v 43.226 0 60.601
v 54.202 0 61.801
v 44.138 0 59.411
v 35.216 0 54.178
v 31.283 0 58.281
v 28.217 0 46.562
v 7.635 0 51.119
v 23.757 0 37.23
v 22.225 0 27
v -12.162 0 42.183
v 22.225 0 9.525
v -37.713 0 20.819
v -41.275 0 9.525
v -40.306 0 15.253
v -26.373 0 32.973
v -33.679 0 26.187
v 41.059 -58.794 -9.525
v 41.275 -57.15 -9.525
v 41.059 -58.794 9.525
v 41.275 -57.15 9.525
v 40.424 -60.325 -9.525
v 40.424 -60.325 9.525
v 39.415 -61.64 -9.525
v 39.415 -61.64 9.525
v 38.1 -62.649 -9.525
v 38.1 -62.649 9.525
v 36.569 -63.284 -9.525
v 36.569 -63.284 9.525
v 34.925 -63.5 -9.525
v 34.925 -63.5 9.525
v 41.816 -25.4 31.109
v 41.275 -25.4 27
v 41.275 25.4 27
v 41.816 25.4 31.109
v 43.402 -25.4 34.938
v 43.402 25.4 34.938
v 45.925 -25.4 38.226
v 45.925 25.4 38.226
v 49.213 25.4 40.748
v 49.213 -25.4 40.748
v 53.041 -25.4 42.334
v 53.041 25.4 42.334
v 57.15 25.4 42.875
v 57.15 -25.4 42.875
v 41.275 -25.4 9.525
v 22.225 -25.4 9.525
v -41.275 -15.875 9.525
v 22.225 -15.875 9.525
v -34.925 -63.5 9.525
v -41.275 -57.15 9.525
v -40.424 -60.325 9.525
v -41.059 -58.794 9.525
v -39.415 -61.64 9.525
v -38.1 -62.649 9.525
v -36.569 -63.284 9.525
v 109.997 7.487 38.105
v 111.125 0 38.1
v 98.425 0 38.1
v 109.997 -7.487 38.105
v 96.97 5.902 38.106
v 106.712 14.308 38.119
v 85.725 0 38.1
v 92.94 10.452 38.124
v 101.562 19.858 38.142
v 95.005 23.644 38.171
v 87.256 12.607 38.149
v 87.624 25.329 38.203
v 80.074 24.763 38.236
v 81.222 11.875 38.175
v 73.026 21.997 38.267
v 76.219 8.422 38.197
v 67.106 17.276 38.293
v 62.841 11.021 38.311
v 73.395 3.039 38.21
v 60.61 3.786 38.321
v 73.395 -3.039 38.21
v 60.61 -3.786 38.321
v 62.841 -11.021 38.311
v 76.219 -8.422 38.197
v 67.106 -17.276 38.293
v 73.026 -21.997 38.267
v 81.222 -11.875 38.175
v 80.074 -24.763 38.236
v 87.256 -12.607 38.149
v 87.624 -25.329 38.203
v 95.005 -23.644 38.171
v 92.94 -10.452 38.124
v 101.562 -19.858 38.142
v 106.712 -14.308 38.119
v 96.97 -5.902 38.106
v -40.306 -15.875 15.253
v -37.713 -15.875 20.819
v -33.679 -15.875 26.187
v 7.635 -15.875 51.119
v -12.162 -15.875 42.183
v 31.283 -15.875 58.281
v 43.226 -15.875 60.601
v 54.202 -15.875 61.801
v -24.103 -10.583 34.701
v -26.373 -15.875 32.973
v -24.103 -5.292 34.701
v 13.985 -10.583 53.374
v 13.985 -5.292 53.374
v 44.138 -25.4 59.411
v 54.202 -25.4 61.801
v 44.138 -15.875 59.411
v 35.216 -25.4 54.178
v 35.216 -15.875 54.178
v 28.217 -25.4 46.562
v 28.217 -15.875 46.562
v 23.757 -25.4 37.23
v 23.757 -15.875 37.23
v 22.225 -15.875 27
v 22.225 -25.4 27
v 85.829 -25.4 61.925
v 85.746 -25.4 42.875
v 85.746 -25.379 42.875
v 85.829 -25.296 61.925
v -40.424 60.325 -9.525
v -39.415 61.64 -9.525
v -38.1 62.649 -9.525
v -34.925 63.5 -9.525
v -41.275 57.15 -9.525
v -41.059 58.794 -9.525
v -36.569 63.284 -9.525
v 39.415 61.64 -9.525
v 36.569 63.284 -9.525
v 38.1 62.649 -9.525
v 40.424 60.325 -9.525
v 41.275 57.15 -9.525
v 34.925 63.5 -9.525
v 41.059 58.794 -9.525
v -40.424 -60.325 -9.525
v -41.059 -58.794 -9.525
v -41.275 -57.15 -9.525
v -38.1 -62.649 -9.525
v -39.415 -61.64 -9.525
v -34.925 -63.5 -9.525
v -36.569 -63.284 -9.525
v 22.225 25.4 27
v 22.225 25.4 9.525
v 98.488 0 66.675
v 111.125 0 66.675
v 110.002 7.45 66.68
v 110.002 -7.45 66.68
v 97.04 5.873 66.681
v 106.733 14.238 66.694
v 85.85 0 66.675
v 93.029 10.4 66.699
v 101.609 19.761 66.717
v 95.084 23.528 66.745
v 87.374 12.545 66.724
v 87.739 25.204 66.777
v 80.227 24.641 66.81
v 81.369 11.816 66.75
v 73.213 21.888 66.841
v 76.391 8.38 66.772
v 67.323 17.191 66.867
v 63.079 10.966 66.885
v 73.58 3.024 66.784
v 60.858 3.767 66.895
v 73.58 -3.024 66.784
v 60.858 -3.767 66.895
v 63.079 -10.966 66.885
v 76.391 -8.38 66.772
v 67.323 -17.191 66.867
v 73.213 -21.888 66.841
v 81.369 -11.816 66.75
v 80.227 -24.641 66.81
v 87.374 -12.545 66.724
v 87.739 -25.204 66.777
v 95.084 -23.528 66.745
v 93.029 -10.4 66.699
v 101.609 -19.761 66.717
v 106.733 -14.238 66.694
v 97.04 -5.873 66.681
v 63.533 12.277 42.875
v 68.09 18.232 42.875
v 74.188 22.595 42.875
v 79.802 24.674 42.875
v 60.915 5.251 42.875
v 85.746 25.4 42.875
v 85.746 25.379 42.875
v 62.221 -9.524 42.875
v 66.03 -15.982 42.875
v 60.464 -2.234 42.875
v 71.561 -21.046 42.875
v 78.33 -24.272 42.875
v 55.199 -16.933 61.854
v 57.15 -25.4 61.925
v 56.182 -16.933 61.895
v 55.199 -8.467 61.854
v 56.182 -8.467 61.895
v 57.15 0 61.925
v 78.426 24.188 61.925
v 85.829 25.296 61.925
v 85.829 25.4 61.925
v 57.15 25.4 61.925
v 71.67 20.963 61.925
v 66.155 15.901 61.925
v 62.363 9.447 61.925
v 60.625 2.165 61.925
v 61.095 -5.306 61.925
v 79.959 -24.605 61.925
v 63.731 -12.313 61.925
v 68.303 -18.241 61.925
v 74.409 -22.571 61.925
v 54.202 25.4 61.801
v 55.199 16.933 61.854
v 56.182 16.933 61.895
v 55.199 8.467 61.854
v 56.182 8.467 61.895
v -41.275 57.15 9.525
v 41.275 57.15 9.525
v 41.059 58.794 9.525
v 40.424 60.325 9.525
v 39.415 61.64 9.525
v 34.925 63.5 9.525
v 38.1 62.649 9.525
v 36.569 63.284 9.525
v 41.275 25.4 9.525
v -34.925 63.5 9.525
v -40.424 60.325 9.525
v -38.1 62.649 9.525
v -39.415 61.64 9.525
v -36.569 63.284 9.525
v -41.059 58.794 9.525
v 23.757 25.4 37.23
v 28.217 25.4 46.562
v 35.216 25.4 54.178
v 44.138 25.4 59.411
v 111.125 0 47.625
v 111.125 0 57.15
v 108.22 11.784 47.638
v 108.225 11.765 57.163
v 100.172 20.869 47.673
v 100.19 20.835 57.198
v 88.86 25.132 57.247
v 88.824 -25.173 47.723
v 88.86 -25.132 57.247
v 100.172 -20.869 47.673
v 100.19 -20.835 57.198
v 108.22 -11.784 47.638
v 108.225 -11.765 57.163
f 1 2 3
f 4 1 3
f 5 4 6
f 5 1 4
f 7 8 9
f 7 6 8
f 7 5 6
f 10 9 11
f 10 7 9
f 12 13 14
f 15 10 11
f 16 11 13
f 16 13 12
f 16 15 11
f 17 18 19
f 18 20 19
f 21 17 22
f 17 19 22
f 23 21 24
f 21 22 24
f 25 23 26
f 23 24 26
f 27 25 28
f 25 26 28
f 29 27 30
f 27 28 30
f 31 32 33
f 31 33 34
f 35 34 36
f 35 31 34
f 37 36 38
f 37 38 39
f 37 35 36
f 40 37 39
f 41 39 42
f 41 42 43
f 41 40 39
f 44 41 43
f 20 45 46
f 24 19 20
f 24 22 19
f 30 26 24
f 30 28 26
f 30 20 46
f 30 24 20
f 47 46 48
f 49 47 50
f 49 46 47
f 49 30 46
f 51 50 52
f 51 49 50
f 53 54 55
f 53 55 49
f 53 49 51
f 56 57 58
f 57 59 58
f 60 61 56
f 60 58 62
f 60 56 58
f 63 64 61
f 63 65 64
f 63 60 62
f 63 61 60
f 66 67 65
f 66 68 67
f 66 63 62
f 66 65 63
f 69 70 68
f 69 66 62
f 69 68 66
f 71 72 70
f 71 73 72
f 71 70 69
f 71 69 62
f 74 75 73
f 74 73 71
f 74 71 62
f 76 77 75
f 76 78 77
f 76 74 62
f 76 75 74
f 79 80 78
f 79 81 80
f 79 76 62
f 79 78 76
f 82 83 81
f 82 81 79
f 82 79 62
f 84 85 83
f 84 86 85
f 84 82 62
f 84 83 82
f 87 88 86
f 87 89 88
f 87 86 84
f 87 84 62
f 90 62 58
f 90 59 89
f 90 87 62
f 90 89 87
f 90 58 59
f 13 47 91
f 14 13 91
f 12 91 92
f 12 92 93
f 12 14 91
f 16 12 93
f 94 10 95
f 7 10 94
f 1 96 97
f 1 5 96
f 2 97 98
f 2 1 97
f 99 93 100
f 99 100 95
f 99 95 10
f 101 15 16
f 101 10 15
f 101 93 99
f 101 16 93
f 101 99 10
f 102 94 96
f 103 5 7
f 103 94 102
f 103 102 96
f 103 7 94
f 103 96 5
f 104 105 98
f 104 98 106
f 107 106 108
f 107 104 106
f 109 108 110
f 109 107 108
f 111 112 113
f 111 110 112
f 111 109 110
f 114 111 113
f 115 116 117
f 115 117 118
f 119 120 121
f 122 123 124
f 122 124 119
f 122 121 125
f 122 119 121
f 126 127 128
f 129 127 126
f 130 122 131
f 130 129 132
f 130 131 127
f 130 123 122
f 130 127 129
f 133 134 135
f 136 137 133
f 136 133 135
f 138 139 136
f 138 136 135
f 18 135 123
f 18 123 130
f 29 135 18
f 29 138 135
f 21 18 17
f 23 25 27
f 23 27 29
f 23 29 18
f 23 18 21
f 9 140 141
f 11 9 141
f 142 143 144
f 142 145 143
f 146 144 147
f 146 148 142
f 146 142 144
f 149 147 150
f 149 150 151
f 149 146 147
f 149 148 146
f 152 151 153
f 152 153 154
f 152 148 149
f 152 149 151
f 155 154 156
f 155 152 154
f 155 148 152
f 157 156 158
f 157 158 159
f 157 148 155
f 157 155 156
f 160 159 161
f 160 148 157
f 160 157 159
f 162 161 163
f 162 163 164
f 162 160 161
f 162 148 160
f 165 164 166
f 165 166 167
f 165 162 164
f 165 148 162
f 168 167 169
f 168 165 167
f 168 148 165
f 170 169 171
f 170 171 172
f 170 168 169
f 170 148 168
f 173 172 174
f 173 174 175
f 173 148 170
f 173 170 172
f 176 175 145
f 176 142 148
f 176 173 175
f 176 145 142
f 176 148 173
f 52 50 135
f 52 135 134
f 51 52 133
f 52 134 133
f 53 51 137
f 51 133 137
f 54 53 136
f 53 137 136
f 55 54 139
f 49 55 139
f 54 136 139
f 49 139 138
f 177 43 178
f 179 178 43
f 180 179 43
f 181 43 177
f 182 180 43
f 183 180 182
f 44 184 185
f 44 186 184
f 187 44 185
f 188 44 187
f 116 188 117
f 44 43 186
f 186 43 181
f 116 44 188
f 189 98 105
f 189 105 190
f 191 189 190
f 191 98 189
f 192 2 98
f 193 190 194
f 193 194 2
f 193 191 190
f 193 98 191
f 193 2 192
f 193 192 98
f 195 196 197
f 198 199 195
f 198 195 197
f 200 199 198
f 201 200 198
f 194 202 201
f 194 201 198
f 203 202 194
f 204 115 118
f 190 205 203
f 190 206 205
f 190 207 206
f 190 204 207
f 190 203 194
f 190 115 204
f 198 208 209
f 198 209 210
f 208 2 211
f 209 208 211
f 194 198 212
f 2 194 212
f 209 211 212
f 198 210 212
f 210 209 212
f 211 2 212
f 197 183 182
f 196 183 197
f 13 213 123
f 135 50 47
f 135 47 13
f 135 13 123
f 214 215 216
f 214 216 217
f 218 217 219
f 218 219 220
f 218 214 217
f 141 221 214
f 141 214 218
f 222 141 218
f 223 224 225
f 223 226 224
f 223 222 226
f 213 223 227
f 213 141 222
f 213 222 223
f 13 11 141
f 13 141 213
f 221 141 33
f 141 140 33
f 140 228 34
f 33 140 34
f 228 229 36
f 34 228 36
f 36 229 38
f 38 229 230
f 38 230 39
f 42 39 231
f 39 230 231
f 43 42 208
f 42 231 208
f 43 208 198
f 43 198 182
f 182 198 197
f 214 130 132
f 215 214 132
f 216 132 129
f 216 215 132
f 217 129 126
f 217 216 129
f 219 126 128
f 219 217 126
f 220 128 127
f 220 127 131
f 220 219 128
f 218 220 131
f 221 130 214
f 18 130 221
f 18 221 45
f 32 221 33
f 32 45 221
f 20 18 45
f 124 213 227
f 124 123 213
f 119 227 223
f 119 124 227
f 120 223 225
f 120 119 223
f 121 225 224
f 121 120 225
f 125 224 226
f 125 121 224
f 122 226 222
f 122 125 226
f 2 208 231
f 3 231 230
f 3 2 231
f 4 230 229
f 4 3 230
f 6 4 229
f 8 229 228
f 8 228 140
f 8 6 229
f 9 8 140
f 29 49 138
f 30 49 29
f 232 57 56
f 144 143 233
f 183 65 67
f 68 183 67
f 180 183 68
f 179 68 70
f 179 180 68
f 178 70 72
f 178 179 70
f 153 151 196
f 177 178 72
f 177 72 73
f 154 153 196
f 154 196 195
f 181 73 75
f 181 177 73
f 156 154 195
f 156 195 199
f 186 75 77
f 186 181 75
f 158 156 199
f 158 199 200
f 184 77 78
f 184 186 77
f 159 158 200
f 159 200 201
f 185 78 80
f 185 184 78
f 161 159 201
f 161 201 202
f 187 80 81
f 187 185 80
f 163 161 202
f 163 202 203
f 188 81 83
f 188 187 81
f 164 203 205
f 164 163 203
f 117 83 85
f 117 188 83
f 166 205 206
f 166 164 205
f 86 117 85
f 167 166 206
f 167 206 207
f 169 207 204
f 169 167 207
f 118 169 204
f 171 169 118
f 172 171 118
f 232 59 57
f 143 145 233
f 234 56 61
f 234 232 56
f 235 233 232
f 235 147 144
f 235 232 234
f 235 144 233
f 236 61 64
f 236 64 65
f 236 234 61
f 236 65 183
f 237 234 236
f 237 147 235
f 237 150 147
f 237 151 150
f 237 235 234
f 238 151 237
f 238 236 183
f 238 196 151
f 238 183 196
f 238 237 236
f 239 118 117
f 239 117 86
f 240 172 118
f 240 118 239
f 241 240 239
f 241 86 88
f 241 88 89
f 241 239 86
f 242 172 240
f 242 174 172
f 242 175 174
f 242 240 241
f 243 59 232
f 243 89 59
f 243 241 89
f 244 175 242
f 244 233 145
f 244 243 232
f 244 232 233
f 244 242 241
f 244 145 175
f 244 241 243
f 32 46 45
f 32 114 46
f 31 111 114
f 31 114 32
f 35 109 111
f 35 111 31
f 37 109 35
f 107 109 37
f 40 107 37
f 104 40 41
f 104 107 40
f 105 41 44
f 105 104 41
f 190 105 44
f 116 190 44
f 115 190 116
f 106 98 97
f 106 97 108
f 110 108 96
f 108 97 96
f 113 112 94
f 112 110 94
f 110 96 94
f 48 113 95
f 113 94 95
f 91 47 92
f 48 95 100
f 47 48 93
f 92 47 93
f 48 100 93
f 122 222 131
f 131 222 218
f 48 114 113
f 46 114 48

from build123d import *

# Parameters (mm, degrees)
F1_DEPTH = 63.5
F2_DEPTH = 25.4
F3_DEPTH = 15.875
F5_R     = 6.35


with BuildPart() as f1:
    # F0 (on Front) → F1 (new body, symmetric)
    with BuildSketch(Plane.XZ):
        Polygon((-41.275, 9.525), (-41.275, -9.525), (41.275, -9.525), (41.275, 9.525), (22.225, 9.525), align=None)
    extrude(amount=F1_DEPTH, both=True)

    # F0 (on Front) → F2 (join, symmetric)
    with BuildSketch(Plane.XZ):
        with BuildLine():
            Line((22.225, 9.525), (41.275, 9.525))
            Line((41.275, 9.525), (41.275, 27.0002))
            ThreePointArc((41.275, 27.0002), (45.9246798487, 38.2255201513), (57.15, 42.8752))
            Line((57.15, 42.8752), (60.325, 42.8752))
            Line((60.325, 42.8752), (60.325, 61.9252))
            Line((60.325, 61.9252), (57.15, 61.9252))
            add(Edge.make_bspline(
                [(54.201505188, 61.8005161386), (55.2055384053, 61.8594589572), (56.1890341086, 61.9011525736), (57.15, 61.9252)],
                knots=[108.3967265897, 108.3967265897, 108.3967265897, 108.3967265897, 111.5045361635, 111.5045361635, 111.5045361635, 111.5045361635], degree=3))
            ThreePointArc((54.201505188, 61.8005161386), (31.4329647285, 50.6304713028), (22.225, 27.0002))
            Line((22.225, 27.0002), (22.225, 9.525))
        make_face()
        Polygon((85.8293095101, 61.9252), (60.325, 61.9252), (60.325, 42.8752), (85.7459063837, 42.8752), align=None)
    extrude(amount=F2_DEPTH, both=True)

    # F0 (on Front) → F3 (join)
    with BuildSketch(Plane.XZ):
        with BuildLine():
            add(Edge.make_bspline(
                [(-41.275, 9.525), (-40.8220224818, 36.7045980931), (19.1820126646, 59.7446602565), (54.201505188, 61.8005161386)],
                knots=[0, 0, 0, 0, 108.3967265897, 108.3967265897, 108.3967265897, 108.3967265897], degree=3))
            Line((-41.275, 9.525), (22.225, 9.525))
            Line((22.225, 9.525), (22.225, 27.0002))
            ThreePointArc((22.225, 27.0002), (31.4329647285, 50.6304713028), (54.201505188, 61.8005161386))
        make_face()
    extrude(amount=F3_DEPTH)

    # F0 (on Front) → F4 (revolve)
    with BuildSketch(Plane.XZ):
        Polygon((85.8501046896, 66.675), (85.8293095101, 61.9252), (85.7459063837, 42.8752), (85.725, 38.1), (111.125, 38.1), (111.125, 66.675), align=None)
    revolve(axis=Axis((85.7875523448, 0, 52.3875), (0.0043780749, 0, 0.9999904162)))

    # F5
    f5_edges = [f1.edges().sort_by_distance(p)[0] for p in [
        (41.275, -63.5, 0),
        (-41.275, -63.5, 0),
        (41.275, 63.5, 0),
        (-41.275, 63.5, 0),
    ]]
    fillet(f5_edges, radius=F5_R)


solid = f1.part
